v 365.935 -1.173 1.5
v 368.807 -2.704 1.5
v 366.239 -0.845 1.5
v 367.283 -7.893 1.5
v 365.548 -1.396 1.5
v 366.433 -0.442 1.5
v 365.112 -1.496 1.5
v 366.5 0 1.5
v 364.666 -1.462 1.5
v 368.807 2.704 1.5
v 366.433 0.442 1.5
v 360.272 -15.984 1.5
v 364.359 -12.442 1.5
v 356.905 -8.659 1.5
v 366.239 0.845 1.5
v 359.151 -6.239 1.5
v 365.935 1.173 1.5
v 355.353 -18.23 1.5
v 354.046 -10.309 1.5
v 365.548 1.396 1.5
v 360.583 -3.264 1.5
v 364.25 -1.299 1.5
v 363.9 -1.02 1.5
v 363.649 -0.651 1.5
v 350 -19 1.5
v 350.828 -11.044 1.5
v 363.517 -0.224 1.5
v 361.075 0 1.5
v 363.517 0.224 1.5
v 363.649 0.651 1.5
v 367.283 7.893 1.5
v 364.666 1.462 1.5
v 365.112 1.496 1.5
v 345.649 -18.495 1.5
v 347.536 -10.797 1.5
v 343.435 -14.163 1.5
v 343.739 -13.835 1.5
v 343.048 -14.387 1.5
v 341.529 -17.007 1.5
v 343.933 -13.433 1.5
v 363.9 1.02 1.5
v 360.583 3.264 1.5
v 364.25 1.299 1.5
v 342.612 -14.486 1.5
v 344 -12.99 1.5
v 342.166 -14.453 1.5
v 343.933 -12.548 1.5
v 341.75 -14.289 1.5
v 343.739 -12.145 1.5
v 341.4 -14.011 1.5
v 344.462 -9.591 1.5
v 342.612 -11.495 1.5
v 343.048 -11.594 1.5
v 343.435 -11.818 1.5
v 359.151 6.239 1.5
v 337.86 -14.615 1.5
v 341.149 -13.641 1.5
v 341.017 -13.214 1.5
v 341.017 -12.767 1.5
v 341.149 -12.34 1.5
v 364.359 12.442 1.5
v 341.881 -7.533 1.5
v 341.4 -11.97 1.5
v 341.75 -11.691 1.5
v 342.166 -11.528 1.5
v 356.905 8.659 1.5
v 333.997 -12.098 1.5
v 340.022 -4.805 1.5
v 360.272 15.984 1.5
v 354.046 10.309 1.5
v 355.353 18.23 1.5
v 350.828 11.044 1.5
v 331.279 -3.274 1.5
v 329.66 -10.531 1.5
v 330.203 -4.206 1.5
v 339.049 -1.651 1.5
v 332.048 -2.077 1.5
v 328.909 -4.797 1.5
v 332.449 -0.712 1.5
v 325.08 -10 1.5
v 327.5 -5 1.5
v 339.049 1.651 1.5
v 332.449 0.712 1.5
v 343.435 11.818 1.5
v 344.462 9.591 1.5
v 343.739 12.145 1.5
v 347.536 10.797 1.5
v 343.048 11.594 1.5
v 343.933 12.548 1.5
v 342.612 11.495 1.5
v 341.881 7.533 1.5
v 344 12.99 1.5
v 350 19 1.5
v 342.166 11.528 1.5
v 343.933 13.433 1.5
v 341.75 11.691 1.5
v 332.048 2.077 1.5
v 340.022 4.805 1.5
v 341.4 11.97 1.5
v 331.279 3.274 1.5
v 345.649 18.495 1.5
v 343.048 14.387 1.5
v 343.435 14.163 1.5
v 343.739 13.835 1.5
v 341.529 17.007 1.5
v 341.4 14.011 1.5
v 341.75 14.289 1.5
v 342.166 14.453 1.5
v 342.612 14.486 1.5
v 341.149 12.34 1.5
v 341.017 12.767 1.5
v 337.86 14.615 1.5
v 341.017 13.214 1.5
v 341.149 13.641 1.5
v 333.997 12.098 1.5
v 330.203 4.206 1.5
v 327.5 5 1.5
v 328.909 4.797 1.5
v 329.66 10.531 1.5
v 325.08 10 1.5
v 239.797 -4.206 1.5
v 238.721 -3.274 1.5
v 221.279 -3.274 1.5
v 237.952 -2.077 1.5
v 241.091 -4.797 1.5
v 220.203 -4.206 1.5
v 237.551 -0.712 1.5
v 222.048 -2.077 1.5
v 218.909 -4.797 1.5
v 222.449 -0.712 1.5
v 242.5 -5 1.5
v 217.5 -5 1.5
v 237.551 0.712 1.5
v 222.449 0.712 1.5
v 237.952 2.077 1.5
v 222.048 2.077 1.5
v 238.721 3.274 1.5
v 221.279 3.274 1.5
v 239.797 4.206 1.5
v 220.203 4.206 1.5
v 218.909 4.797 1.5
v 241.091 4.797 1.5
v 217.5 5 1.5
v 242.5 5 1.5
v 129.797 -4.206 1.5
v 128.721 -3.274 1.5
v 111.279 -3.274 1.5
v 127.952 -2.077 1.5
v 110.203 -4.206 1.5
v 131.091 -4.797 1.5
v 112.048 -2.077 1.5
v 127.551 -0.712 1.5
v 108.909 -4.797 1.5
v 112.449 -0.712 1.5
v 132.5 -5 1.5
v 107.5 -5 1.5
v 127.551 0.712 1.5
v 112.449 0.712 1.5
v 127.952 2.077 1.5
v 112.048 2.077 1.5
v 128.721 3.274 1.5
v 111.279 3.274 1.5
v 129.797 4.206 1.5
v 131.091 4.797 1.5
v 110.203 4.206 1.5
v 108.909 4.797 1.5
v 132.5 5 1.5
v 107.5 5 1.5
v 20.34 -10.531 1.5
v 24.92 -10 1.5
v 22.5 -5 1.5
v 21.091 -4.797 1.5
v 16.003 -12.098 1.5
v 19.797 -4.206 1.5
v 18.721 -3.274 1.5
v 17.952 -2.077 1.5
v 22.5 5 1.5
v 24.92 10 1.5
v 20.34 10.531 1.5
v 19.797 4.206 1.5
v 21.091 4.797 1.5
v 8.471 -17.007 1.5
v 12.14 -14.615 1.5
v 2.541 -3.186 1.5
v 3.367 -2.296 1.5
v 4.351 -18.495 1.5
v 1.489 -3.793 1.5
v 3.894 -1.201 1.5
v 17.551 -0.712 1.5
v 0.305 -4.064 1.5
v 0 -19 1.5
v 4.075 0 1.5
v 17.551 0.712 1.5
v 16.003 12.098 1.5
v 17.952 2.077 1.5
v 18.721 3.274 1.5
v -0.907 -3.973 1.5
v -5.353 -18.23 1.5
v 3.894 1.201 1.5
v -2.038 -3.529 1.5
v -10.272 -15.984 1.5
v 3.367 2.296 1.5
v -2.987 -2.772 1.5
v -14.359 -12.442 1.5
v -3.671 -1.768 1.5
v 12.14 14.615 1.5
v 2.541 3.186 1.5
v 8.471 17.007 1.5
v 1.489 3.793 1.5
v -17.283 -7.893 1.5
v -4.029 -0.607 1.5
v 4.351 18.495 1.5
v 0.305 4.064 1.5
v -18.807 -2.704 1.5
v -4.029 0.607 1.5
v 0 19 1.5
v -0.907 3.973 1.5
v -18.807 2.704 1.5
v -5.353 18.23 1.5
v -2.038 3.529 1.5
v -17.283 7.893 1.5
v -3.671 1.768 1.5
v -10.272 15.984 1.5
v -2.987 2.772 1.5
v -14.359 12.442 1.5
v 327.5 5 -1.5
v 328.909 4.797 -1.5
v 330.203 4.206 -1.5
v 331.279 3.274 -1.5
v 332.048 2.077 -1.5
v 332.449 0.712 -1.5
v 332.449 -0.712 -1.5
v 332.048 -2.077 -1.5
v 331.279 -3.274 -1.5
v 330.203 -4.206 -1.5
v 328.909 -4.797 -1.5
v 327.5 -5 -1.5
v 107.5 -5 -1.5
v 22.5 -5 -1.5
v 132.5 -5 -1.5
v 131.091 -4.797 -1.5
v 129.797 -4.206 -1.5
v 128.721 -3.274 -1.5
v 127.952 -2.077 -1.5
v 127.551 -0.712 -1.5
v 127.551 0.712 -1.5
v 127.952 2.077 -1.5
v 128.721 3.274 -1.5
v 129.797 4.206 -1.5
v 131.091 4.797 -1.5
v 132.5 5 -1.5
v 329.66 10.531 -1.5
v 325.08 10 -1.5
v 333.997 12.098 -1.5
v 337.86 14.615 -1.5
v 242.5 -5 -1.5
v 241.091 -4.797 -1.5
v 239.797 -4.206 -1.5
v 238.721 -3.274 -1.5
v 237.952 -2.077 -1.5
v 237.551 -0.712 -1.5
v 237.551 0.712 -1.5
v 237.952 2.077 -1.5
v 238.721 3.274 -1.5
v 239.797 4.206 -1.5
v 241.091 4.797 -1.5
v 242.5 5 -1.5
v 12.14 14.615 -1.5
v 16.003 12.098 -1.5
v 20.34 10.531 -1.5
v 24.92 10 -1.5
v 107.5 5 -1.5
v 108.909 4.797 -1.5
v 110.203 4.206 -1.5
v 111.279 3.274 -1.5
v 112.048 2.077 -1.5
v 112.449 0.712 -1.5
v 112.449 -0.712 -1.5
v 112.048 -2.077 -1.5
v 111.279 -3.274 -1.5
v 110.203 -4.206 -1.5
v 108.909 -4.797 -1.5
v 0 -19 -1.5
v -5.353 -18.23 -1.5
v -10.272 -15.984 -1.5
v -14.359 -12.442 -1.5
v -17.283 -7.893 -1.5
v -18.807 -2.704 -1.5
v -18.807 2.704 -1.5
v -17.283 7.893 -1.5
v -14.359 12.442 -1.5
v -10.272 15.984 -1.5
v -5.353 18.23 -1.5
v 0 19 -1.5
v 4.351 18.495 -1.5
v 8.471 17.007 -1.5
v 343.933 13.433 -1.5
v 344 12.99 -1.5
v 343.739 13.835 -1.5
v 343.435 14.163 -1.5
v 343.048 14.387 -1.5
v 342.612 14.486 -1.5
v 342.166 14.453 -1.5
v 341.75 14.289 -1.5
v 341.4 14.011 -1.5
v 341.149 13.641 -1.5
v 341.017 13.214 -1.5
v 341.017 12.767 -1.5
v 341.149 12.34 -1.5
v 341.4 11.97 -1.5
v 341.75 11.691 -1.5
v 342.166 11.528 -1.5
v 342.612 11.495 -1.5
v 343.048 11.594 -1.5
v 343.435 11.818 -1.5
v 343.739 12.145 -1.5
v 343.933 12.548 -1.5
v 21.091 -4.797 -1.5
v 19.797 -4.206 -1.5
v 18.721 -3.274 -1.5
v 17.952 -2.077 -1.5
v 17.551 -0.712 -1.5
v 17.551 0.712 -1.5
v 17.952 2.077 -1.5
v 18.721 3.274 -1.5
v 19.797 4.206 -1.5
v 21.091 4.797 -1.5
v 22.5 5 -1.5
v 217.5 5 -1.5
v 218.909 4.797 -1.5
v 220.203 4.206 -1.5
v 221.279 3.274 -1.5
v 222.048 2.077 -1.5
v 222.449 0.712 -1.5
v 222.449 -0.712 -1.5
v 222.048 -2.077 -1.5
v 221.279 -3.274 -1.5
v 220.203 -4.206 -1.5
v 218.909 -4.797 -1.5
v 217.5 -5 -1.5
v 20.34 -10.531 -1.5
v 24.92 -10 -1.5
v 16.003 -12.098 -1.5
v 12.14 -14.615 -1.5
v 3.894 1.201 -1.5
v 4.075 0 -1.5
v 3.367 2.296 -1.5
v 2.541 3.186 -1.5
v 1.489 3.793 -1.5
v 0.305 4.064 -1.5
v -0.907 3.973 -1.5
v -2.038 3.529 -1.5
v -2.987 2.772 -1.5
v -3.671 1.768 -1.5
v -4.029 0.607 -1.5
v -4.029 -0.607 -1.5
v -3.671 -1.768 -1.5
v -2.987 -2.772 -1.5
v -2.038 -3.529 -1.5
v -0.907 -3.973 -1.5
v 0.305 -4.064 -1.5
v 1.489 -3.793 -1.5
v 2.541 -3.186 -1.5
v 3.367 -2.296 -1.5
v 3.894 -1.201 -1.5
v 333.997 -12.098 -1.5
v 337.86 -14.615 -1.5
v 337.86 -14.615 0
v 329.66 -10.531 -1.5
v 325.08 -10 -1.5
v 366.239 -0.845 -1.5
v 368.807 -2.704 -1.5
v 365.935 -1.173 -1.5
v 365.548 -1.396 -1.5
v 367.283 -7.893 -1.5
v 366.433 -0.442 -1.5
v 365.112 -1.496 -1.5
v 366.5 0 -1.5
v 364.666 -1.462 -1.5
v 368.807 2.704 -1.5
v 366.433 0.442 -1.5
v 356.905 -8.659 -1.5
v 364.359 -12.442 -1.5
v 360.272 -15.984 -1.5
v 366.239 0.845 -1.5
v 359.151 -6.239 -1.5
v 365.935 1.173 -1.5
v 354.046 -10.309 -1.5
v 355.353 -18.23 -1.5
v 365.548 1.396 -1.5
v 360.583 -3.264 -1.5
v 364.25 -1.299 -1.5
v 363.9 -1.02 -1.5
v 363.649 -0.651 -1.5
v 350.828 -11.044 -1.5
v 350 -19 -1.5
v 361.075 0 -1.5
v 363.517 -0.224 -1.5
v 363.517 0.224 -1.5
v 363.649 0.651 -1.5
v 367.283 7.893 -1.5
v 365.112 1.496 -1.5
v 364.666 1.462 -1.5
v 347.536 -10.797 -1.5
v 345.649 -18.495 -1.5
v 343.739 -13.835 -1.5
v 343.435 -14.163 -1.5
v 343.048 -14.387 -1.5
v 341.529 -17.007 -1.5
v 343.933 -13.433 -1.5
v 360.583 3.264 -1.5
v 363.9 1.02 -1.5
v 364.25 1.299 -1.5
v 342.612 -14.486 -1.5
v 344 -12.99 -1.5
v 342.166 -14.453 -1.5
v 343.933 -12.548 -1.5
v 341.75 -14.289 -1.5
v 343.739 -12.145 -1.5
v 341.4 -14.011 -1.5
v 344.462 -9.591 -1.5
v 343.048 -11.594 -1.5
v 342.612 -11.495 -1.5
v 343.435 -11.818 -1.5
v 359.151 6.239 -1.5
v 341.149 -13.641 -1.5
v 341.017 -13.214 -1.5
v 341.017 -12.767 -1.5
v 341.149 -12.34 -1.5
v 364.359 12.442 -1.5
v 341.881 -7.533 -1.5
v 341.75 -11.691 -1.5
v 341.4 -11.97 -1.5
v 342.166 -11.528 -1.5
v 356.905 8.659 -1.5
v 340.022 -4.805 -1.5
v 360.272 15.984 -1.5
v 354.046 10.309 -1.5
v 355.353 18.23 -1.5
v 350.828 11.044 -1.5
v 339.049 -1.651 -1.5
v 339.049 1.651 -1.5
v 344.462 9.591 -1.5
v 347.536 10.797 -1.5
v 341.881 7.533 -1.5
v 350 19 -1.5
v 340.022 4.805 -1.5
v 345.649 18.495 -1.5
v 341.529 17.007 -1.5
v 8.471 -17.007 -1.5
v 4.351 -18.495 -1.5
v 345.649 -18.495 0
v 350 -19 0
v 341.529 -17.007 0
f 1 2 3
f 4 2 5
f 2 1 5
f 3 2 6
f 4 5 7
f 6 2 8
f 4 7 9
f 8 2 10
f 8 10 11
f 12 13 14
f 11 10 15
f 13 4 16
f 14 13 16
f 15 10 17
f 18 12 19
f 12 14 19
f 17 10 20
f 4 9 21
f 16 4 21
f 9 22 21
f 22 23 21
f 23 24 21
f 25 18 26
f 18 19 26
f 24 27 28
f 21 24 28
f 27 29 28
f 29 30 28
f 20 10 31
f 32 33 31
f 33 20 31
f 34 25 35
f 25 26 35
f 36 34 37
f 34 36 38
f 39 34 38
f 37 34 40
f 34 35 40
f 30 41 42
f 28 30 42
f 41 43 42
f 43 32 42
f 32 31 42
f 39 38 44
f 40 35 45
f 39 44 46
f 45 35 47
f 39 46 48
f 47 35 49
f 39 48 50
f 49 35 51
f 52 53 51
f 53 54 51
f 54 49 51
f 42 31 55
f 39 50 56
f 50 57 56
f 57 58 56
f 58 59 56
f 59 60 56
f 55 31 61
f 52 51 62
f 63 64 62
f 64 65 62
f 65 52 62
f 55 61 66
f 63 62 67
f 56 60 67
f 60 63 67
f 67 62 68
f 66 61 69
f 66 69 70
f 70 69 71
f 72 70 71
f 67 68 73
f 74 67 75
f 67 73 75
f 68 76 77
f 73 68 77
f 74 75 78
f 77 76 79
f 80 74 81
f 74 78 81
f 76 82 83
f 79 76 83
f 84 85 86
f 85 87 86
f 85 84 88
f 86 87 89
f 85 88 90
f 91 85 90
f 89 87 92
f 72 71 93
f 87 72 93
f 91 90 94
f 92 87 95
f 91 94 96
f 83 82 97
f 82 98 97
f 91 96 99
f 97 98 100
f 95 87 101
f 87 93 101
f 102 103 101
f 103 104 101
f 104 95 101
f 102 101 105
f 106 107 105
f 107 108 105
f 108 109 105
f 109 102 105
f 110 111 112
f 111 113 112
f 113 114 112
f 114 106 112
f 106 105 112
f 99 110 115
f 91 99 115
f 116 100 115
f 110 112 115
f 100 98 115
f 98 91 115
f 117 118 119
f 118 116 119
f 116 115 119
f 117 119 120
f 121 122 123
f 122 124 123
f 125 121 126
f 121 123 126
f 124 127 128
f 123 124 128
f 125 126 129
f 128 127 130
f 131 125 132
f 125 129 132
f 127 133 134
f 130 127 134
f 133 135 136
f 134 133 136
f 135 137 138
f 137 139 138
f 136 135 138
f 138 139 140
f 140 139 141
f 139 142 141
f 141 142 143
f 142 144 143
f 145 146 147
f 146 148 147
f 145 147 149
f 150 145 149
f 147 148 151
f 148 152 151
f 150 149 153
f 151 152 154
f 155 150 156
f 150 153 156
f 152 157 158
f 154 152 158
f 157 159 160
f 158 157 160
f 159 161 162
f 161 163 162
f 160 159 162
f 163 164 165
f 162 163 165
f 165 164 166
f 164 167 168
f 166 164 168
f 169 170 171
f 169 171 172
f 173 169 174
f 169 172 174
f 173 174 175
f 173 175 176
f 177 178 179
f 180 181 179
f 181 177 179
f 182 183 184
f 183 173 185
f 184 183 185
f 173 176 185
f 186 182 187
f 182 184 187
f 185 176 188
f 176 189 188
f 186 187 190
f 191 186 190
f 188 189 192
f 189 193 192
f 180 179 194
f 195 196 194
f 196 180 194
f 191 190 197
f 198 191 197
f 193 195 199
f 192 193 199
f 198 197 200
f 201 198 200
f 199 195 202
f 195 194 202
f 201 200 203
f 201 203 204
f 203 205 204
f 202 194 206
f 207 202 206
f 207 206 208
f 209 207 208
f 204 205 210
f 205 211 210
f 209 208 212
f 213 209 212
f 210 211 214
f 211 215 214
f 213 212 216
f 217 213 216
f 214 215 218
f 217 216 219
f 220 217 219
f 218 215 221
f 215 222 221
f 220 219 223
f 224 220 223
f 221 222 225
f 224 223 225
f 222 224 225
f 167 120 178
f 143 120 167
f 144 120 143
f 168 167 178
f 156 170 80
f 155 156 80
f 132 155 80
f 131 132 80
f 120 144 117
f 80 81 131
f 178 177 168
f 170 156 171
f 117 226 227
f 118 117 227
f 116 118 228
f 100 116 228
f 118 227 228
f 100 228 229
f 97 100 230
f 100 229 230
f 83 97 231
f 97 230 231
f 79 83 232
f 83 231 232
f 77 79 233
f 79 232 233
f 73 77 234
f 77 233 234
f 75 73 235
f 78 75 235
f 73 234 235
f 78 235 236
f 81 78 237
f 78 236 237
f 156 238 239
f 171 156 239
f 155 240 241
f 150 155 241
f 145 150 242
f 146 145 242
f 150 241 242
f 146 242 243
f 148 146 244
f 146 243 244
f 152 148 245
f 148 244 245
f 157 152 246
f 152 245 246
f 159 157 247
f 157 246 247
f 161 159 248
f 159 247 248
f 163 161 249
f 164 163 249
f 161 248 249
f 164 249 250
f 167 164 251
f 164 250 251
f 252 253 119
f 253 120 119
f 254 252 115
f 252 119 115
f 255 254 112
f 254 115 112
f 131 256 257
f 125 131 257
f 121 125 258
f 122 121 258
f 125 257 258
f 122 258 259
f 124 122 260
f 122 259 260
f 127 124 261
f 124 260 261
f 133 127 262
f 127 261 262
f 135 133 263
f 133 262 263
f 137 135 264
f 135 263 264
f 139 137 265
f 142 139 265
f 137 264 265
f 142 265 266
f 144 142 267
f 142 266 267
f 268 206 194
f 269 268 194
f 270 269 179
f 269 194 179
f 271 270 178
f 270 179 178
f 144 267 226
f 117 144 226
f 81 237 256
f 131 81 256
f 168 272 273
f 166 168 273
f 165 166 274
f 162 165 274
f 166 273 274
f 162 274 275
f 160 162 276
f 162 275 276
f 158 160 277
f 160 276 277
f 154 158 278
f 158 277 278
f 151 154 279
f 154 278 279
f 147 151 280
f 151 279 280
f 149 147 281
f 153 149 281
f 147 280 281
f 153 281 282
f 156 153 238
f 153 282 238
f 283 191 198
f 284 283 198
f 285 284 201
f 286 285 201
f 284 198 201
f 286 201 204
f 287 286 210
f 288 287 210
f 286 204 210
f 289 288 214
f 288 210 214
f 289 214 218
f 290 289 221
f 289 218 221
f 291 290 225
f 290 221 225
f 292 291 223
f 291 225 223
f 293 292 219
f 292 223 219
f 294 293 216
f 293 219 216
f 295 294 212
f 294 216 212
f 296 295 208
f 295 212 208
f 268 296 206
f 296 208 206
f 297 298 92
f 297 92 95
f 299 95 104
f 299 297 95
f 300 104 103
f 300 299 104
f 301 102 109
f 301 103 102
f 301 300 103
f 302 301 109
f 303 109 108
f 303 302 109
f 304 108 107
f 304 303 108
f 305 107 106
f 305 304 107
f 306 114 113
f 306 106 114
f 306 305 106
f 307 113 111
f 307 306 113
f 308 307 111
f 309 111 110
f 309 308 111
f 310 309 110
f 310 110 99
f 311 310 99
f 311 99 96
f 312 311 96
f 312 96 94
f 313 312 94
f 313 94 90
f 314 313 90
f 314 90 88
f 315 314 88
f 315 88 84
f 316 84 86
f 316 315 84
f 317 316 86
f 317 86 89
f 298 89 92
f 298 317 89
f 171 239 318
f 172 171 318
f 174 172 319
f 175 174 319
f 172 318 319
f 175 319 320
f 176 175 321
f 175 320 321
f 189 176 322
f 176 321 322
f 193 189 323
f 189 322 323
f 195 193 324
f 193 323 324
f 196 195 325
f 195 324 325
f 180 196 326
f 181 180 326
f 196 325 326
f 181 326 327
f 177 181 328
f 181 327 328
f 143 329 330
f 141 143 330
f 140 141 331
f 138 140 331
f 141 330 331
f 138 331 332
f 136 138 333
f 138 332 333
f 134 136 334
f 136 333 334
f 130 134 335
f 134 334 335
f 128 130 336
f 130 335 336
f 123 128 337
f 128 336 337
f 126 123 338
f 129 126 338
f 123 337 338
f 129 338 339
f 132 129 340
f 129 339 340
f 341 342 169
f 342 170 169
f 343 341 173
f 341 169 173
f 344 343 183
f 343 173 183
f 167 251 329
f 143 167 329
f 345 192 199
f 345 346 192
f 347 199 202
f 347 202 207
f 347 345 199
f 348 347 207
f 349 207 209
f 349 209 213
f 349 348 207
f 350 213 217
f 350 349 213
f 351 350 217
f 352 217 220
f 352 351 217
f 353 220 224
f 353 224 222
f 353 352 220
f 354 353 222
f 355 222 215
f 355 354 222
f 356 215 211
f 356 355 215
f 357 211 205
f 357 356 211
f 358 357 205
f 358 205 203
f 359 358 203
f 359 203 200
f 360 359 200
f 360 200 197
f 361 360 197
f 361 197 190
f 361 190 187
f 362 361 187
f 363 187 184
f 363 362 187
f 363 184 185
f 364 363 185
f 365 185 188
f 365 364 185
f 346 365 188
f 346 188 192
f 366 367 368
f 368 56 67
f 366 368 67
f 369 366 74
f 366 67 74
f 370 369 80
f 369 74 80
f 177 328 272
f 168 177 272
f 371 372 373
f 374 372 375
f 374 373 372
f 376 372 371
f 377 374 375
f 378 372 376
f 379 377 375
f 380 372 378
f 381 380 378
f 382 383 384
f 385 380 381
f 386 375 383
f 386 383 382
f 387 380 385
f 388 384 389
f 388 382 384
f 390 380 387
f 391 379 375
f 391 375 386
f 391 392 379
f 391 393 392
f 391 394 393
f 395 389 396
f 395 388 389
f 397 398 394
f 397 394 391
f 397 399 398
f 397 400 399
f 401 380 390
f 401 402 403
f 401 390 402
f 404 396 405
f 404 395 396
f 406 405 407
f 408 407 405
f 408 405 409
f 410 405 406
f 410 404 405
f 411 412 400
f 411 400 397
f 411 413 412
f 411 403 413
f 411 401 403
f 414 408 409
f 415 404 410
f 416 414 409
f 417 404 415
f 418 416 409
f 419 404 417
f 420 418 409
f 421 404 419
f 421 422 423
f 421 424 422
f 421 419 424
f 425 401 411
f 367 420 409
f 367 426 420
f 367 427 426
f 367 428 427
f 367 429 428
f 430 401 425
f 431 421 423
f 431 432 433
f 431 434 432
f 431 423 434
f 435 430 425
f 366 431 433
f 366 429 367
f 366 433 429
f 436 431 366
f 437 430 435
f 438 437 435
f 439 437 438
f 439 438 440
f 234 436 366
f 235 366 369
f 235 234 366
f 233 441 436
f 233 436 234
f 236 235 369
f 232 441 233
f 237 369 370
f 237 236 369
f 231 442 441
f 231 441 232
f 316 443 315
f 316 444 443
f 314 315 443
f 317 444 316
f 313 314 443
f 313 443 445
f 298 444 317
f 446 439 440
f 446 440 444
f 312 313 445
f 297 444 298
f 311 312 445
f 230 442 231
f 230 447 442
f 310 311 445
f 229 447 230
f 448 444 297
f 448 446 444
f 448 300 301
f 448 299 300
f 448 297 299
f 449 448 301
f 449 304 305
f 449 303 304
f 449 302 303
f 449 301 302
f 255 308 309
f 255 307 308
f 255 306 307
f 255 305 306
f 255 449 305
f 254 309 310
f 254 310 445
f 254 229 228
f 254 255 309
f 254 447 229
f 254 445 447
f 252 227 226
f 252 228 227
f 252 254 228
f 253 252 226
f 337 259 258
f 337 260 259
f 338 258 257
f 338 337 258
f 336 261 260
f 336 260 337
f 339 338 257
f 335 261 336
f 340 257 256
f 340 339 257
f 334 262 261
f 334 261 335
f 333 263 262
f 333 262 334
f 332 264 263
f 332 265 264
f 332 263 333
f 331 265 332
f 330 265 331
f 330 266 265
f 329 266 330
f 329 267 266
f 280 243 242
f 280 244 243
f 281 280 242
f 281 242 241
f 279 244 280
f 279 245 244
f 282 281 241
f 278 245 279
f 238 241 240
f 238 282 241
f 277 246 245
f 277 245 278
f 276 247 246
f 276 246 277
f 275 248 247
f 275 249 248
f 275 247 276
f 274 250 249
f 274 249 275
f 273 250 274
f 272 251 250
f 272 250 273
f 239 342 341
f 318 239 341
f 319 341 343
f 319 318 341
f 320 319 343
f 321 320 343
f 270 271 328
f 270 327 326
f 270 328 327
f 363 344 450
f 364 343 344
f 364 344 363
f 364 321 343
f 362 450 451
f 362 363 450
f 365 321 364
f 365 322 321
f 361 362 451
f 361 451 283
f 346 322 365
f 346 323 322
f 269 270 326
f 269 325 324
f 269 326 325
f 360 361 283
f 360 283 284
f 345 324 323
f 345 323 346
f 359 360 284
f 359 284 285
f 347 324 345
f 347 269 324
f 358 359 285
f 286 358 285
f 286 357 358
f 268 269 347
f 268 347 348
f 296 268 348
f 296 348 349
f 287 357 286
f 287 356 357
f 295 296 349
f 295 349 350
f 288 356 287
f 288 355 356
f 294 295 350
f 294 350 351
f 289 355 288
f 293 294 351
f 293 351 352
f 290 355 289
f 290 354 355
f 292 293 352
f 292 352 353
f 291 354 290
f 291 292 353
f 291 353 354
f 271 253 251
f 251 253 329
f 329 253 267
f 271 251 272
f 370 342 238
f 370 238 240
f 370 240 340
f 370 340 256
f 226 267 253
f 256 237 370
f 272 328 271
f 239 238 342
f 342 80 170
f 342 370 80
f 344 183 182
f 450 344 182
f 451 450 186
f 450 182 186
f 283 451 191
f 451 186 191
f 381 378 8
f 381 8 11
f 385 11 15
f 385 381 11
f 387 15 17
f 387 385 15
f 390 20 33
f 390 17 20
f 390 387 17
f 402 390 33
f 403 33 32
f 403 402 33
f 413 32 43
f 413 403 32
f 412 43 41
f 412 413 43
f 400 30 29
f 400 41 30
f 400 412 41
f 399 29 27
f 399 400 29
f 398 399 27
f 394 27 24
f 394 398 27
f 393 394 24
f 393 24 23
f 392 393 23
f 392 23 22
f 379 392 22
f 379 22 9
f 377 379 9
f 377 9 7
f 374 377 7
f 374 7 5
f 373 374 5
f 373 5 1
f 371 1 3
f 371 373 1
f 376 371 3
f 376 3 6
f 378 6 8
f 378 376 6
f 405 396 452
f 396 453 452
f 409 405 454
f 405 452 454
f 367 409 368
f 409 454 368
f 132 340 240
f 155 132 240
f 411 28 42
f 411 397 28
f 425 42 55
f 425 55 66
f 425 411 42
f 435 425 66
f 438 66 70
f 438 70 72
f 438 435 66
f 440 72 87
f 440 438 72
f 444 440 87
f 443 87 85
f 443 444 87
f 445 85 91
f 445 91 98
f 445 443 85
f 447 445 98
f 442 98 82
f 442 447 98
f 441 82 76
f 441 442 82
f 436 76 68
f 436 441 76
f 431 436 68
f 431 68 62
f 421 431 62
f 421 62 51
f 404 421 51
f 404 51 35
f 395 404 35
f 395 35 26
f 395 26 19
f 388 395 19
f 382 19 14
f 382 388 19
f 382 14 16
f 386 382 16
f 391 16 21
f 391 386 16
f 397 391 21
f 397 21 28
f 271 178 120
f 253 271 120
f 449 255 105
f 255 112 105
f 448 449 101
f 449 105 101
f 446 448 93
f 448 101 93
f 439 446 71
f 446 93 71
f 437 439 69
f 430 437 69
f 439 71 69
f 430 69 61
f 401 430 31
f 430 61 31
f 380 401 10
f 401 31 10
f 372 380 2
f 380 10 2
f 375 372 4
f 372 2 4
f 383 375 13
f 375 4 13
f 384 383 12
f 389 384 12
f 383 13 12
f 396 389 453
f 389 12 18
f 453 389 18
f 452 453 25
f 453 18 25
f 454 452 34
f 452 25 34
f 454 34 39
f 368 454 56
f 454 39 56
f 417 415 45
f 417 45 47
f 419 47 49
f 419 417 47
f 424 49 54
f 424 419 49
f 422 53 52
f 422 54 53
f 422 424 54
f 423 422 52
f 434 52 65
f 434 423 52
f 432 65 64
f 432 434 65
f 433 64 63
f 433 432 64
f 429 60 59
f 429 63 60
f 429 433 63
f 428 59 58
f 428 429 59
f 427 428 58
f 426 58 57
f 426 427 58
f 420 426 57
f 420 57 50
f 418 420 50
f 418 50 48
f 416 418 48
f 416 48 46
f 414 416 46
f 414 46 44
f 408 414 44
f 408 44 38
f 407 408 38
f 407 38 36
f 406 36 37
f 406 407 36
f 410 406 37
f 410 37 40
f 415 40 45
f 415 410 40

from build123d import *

# Parameters (mm, degrees)
SKETCH1_R               = 4.075
SKETCH1_R_2             = 11.075
BOSS_EXTRUDE1_DEPTH     = 1.5
CUT_EXTRUDE2_DEPTH      = 370.491880831
CUT_EXTRUDE2_DEPTH_BACK = 370.491880831
SKETCH3_R               = 1.5
CUT_EXTRUDE3_DEPTH      = 370.491880831
CUT_EXTRUDE3_DEPTH_BACK = 370.491880831


with BuildPart() as part:
    # Sketch1 → Boss-Extrude1 (new, symmetric)
    with BuildSketch(Plane.XY):
        with BuildLine():
            Line((24.919871589, 10), (325.080128411, 10))
            ThreePointArc((325.080128411, 10), (331.873790616, 11.189201137), (337.859549739, 14.615384615))
            ThreePointArc((337.859549739, 14.615384615), (343.546020905, 17.870258919), (350, 19))
            ThreePointArc((350, 19), (369, 0), (350, -19))
            ThreePointArc((350, -19), (343.546020905, -17.870258919), (337.859549739, -14.615384615))
            ThreePointArc((337.859549739, -14.615384615), (331.873790616, -11.189201137), (325.080128411, -10))
            Line((325.080128411, -10), (24.919871589, -10))
            ThreePointArc((24.919871589, -10), (18.126209384, -11.189201137), (12.140450261, -14.615384615))
            ThreePointArc((12.140450261, -14.615384615), (6.453979095, -17.870258919), (0, -19))
            ThreePointArc((0, -19), (-19, 0), (0, 19))
            ThreePointArc((0, 19), (6.453979095, 17.870258919), (12.140450261, 14.615384615))
            ThreePointArc((12.140450261, 14.615384615), (18.126209384, 11.189201137), (24.919871589, 10))
        make_face()
        Circle(SKETCH1_R, mode=Mode.SUBTRACT)
        with Locations((350, 0)):
            Circle(SKETCH1_R_2, mode=Mode.SUBTRACT)
    extrude(amount=BOSS_EXTRUDE1_DEPTH, both=True)

    # Sketch3 → Cut-Extrude2 (cut, two sides: drawn at the far end of the back side and taken through both)
    with BuildSketch(Plane.XY.offset(-CUT_EXTRUDE2_DEPTH_BACK)):
        with Locations((365, 0)):
            Circle(SKETCH3_R)
        with Locations((342.5, -12.990381057)):
            Circle(SKETCH3_R)
        with Locations((342.5, 12.990381057)):
            Circle(SKETCH3_R)
    extrude(amount=CUT_EXTRUDE2_DEPTH + CUT_EXTRUDE2_DEPTH_BACK, mode=Mode.SUBTRACT)

    # Sketch4 → Cut-Extrude3 (cut, two sides: drawn at the far end of the back side and taken through both)
    with BuildSketch(Plane.XY.offset(-CUT_EXTRUDE3_DEPTH_BACK)):
        with BuildLine():
            Line((22.5, 5), (107.5, 5))
            ThreePointArc((107.5, 5), (112.5, 0), (107.5, -5))
            Line((107.5, -5), (22.5, -5))
            ThreePointArc((22.5, -5), (17.5, 0), (22.5, 5))
        make_face()
        with BuildLine():
            Line((132.5, 5), (217.5, 5))
            ThreePointArc((217.5, 5), (222.5, 0), (217.5, -5))
            Line((217.5, -5), (132.5, -5))
            ThreePointArc((132.5, -5), (127.5, 0), (132.5, 5))
        make_face()
        with BuildLine():
            Line((242.5, 5), (327.5, 5))
            ThreePointArc((327.5, 5), (332.5, 0), (327.5, -5))
            Line((327.5, -5), (242.5, -5))
            ThreePointArc((242.5, -5), (237.5, 0), (242.5, 5))
        make_face()
    extrude(amount=CUT_EXTRUDE3_DEPTH + CUT_EXTRUDE3_DEPTH_BACK, mode=Mode.SUBTRACT)


solid = part.part
